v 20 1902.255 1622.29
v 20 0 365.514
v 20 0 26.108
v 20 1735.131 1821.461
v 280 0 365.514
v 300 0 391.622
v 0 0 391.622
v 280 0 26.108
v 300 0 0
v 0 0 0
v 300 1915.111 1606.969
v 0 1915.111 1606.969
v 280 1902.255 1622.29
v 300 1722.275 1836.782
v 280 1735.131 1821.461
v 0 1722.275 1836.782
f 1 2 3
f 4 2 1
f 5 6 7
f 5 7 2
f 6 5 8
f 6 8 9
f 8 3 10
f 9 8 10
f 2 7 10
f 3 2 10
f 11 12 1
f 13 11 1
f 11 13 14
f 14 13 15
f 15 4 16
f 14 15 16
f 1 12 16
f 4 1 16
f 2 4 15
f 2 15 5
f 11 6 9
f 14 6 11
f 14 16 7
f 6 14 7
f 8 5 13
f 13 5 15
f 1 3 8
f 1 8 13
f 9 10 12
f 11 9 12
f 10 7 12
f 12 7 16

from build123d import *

# Parameters (mm, degrees)
F1_DEPTH = 300
F2_T     = -20


with BuildPart() as f1:
    # F0 (on Right) → F1 (new body)
    with BuildSketch(Plane.YZ):
        Polygon((0, 391.622187), (0, 0), (1915.111108, 1606.969024), (1722.274825, 1836.782357), align=None)
    extrude(amount=F1_DEPTH)

    # F2
    f2_openings = [f1.faces().sort_by_distance(p)[0] for p in [
        (150, 0, 195.811093),
        (150, 1818.692966, 1721.875691),
    ]]
    offset(amount=F2_T, openings=f2_openings)


solid = f1.part
